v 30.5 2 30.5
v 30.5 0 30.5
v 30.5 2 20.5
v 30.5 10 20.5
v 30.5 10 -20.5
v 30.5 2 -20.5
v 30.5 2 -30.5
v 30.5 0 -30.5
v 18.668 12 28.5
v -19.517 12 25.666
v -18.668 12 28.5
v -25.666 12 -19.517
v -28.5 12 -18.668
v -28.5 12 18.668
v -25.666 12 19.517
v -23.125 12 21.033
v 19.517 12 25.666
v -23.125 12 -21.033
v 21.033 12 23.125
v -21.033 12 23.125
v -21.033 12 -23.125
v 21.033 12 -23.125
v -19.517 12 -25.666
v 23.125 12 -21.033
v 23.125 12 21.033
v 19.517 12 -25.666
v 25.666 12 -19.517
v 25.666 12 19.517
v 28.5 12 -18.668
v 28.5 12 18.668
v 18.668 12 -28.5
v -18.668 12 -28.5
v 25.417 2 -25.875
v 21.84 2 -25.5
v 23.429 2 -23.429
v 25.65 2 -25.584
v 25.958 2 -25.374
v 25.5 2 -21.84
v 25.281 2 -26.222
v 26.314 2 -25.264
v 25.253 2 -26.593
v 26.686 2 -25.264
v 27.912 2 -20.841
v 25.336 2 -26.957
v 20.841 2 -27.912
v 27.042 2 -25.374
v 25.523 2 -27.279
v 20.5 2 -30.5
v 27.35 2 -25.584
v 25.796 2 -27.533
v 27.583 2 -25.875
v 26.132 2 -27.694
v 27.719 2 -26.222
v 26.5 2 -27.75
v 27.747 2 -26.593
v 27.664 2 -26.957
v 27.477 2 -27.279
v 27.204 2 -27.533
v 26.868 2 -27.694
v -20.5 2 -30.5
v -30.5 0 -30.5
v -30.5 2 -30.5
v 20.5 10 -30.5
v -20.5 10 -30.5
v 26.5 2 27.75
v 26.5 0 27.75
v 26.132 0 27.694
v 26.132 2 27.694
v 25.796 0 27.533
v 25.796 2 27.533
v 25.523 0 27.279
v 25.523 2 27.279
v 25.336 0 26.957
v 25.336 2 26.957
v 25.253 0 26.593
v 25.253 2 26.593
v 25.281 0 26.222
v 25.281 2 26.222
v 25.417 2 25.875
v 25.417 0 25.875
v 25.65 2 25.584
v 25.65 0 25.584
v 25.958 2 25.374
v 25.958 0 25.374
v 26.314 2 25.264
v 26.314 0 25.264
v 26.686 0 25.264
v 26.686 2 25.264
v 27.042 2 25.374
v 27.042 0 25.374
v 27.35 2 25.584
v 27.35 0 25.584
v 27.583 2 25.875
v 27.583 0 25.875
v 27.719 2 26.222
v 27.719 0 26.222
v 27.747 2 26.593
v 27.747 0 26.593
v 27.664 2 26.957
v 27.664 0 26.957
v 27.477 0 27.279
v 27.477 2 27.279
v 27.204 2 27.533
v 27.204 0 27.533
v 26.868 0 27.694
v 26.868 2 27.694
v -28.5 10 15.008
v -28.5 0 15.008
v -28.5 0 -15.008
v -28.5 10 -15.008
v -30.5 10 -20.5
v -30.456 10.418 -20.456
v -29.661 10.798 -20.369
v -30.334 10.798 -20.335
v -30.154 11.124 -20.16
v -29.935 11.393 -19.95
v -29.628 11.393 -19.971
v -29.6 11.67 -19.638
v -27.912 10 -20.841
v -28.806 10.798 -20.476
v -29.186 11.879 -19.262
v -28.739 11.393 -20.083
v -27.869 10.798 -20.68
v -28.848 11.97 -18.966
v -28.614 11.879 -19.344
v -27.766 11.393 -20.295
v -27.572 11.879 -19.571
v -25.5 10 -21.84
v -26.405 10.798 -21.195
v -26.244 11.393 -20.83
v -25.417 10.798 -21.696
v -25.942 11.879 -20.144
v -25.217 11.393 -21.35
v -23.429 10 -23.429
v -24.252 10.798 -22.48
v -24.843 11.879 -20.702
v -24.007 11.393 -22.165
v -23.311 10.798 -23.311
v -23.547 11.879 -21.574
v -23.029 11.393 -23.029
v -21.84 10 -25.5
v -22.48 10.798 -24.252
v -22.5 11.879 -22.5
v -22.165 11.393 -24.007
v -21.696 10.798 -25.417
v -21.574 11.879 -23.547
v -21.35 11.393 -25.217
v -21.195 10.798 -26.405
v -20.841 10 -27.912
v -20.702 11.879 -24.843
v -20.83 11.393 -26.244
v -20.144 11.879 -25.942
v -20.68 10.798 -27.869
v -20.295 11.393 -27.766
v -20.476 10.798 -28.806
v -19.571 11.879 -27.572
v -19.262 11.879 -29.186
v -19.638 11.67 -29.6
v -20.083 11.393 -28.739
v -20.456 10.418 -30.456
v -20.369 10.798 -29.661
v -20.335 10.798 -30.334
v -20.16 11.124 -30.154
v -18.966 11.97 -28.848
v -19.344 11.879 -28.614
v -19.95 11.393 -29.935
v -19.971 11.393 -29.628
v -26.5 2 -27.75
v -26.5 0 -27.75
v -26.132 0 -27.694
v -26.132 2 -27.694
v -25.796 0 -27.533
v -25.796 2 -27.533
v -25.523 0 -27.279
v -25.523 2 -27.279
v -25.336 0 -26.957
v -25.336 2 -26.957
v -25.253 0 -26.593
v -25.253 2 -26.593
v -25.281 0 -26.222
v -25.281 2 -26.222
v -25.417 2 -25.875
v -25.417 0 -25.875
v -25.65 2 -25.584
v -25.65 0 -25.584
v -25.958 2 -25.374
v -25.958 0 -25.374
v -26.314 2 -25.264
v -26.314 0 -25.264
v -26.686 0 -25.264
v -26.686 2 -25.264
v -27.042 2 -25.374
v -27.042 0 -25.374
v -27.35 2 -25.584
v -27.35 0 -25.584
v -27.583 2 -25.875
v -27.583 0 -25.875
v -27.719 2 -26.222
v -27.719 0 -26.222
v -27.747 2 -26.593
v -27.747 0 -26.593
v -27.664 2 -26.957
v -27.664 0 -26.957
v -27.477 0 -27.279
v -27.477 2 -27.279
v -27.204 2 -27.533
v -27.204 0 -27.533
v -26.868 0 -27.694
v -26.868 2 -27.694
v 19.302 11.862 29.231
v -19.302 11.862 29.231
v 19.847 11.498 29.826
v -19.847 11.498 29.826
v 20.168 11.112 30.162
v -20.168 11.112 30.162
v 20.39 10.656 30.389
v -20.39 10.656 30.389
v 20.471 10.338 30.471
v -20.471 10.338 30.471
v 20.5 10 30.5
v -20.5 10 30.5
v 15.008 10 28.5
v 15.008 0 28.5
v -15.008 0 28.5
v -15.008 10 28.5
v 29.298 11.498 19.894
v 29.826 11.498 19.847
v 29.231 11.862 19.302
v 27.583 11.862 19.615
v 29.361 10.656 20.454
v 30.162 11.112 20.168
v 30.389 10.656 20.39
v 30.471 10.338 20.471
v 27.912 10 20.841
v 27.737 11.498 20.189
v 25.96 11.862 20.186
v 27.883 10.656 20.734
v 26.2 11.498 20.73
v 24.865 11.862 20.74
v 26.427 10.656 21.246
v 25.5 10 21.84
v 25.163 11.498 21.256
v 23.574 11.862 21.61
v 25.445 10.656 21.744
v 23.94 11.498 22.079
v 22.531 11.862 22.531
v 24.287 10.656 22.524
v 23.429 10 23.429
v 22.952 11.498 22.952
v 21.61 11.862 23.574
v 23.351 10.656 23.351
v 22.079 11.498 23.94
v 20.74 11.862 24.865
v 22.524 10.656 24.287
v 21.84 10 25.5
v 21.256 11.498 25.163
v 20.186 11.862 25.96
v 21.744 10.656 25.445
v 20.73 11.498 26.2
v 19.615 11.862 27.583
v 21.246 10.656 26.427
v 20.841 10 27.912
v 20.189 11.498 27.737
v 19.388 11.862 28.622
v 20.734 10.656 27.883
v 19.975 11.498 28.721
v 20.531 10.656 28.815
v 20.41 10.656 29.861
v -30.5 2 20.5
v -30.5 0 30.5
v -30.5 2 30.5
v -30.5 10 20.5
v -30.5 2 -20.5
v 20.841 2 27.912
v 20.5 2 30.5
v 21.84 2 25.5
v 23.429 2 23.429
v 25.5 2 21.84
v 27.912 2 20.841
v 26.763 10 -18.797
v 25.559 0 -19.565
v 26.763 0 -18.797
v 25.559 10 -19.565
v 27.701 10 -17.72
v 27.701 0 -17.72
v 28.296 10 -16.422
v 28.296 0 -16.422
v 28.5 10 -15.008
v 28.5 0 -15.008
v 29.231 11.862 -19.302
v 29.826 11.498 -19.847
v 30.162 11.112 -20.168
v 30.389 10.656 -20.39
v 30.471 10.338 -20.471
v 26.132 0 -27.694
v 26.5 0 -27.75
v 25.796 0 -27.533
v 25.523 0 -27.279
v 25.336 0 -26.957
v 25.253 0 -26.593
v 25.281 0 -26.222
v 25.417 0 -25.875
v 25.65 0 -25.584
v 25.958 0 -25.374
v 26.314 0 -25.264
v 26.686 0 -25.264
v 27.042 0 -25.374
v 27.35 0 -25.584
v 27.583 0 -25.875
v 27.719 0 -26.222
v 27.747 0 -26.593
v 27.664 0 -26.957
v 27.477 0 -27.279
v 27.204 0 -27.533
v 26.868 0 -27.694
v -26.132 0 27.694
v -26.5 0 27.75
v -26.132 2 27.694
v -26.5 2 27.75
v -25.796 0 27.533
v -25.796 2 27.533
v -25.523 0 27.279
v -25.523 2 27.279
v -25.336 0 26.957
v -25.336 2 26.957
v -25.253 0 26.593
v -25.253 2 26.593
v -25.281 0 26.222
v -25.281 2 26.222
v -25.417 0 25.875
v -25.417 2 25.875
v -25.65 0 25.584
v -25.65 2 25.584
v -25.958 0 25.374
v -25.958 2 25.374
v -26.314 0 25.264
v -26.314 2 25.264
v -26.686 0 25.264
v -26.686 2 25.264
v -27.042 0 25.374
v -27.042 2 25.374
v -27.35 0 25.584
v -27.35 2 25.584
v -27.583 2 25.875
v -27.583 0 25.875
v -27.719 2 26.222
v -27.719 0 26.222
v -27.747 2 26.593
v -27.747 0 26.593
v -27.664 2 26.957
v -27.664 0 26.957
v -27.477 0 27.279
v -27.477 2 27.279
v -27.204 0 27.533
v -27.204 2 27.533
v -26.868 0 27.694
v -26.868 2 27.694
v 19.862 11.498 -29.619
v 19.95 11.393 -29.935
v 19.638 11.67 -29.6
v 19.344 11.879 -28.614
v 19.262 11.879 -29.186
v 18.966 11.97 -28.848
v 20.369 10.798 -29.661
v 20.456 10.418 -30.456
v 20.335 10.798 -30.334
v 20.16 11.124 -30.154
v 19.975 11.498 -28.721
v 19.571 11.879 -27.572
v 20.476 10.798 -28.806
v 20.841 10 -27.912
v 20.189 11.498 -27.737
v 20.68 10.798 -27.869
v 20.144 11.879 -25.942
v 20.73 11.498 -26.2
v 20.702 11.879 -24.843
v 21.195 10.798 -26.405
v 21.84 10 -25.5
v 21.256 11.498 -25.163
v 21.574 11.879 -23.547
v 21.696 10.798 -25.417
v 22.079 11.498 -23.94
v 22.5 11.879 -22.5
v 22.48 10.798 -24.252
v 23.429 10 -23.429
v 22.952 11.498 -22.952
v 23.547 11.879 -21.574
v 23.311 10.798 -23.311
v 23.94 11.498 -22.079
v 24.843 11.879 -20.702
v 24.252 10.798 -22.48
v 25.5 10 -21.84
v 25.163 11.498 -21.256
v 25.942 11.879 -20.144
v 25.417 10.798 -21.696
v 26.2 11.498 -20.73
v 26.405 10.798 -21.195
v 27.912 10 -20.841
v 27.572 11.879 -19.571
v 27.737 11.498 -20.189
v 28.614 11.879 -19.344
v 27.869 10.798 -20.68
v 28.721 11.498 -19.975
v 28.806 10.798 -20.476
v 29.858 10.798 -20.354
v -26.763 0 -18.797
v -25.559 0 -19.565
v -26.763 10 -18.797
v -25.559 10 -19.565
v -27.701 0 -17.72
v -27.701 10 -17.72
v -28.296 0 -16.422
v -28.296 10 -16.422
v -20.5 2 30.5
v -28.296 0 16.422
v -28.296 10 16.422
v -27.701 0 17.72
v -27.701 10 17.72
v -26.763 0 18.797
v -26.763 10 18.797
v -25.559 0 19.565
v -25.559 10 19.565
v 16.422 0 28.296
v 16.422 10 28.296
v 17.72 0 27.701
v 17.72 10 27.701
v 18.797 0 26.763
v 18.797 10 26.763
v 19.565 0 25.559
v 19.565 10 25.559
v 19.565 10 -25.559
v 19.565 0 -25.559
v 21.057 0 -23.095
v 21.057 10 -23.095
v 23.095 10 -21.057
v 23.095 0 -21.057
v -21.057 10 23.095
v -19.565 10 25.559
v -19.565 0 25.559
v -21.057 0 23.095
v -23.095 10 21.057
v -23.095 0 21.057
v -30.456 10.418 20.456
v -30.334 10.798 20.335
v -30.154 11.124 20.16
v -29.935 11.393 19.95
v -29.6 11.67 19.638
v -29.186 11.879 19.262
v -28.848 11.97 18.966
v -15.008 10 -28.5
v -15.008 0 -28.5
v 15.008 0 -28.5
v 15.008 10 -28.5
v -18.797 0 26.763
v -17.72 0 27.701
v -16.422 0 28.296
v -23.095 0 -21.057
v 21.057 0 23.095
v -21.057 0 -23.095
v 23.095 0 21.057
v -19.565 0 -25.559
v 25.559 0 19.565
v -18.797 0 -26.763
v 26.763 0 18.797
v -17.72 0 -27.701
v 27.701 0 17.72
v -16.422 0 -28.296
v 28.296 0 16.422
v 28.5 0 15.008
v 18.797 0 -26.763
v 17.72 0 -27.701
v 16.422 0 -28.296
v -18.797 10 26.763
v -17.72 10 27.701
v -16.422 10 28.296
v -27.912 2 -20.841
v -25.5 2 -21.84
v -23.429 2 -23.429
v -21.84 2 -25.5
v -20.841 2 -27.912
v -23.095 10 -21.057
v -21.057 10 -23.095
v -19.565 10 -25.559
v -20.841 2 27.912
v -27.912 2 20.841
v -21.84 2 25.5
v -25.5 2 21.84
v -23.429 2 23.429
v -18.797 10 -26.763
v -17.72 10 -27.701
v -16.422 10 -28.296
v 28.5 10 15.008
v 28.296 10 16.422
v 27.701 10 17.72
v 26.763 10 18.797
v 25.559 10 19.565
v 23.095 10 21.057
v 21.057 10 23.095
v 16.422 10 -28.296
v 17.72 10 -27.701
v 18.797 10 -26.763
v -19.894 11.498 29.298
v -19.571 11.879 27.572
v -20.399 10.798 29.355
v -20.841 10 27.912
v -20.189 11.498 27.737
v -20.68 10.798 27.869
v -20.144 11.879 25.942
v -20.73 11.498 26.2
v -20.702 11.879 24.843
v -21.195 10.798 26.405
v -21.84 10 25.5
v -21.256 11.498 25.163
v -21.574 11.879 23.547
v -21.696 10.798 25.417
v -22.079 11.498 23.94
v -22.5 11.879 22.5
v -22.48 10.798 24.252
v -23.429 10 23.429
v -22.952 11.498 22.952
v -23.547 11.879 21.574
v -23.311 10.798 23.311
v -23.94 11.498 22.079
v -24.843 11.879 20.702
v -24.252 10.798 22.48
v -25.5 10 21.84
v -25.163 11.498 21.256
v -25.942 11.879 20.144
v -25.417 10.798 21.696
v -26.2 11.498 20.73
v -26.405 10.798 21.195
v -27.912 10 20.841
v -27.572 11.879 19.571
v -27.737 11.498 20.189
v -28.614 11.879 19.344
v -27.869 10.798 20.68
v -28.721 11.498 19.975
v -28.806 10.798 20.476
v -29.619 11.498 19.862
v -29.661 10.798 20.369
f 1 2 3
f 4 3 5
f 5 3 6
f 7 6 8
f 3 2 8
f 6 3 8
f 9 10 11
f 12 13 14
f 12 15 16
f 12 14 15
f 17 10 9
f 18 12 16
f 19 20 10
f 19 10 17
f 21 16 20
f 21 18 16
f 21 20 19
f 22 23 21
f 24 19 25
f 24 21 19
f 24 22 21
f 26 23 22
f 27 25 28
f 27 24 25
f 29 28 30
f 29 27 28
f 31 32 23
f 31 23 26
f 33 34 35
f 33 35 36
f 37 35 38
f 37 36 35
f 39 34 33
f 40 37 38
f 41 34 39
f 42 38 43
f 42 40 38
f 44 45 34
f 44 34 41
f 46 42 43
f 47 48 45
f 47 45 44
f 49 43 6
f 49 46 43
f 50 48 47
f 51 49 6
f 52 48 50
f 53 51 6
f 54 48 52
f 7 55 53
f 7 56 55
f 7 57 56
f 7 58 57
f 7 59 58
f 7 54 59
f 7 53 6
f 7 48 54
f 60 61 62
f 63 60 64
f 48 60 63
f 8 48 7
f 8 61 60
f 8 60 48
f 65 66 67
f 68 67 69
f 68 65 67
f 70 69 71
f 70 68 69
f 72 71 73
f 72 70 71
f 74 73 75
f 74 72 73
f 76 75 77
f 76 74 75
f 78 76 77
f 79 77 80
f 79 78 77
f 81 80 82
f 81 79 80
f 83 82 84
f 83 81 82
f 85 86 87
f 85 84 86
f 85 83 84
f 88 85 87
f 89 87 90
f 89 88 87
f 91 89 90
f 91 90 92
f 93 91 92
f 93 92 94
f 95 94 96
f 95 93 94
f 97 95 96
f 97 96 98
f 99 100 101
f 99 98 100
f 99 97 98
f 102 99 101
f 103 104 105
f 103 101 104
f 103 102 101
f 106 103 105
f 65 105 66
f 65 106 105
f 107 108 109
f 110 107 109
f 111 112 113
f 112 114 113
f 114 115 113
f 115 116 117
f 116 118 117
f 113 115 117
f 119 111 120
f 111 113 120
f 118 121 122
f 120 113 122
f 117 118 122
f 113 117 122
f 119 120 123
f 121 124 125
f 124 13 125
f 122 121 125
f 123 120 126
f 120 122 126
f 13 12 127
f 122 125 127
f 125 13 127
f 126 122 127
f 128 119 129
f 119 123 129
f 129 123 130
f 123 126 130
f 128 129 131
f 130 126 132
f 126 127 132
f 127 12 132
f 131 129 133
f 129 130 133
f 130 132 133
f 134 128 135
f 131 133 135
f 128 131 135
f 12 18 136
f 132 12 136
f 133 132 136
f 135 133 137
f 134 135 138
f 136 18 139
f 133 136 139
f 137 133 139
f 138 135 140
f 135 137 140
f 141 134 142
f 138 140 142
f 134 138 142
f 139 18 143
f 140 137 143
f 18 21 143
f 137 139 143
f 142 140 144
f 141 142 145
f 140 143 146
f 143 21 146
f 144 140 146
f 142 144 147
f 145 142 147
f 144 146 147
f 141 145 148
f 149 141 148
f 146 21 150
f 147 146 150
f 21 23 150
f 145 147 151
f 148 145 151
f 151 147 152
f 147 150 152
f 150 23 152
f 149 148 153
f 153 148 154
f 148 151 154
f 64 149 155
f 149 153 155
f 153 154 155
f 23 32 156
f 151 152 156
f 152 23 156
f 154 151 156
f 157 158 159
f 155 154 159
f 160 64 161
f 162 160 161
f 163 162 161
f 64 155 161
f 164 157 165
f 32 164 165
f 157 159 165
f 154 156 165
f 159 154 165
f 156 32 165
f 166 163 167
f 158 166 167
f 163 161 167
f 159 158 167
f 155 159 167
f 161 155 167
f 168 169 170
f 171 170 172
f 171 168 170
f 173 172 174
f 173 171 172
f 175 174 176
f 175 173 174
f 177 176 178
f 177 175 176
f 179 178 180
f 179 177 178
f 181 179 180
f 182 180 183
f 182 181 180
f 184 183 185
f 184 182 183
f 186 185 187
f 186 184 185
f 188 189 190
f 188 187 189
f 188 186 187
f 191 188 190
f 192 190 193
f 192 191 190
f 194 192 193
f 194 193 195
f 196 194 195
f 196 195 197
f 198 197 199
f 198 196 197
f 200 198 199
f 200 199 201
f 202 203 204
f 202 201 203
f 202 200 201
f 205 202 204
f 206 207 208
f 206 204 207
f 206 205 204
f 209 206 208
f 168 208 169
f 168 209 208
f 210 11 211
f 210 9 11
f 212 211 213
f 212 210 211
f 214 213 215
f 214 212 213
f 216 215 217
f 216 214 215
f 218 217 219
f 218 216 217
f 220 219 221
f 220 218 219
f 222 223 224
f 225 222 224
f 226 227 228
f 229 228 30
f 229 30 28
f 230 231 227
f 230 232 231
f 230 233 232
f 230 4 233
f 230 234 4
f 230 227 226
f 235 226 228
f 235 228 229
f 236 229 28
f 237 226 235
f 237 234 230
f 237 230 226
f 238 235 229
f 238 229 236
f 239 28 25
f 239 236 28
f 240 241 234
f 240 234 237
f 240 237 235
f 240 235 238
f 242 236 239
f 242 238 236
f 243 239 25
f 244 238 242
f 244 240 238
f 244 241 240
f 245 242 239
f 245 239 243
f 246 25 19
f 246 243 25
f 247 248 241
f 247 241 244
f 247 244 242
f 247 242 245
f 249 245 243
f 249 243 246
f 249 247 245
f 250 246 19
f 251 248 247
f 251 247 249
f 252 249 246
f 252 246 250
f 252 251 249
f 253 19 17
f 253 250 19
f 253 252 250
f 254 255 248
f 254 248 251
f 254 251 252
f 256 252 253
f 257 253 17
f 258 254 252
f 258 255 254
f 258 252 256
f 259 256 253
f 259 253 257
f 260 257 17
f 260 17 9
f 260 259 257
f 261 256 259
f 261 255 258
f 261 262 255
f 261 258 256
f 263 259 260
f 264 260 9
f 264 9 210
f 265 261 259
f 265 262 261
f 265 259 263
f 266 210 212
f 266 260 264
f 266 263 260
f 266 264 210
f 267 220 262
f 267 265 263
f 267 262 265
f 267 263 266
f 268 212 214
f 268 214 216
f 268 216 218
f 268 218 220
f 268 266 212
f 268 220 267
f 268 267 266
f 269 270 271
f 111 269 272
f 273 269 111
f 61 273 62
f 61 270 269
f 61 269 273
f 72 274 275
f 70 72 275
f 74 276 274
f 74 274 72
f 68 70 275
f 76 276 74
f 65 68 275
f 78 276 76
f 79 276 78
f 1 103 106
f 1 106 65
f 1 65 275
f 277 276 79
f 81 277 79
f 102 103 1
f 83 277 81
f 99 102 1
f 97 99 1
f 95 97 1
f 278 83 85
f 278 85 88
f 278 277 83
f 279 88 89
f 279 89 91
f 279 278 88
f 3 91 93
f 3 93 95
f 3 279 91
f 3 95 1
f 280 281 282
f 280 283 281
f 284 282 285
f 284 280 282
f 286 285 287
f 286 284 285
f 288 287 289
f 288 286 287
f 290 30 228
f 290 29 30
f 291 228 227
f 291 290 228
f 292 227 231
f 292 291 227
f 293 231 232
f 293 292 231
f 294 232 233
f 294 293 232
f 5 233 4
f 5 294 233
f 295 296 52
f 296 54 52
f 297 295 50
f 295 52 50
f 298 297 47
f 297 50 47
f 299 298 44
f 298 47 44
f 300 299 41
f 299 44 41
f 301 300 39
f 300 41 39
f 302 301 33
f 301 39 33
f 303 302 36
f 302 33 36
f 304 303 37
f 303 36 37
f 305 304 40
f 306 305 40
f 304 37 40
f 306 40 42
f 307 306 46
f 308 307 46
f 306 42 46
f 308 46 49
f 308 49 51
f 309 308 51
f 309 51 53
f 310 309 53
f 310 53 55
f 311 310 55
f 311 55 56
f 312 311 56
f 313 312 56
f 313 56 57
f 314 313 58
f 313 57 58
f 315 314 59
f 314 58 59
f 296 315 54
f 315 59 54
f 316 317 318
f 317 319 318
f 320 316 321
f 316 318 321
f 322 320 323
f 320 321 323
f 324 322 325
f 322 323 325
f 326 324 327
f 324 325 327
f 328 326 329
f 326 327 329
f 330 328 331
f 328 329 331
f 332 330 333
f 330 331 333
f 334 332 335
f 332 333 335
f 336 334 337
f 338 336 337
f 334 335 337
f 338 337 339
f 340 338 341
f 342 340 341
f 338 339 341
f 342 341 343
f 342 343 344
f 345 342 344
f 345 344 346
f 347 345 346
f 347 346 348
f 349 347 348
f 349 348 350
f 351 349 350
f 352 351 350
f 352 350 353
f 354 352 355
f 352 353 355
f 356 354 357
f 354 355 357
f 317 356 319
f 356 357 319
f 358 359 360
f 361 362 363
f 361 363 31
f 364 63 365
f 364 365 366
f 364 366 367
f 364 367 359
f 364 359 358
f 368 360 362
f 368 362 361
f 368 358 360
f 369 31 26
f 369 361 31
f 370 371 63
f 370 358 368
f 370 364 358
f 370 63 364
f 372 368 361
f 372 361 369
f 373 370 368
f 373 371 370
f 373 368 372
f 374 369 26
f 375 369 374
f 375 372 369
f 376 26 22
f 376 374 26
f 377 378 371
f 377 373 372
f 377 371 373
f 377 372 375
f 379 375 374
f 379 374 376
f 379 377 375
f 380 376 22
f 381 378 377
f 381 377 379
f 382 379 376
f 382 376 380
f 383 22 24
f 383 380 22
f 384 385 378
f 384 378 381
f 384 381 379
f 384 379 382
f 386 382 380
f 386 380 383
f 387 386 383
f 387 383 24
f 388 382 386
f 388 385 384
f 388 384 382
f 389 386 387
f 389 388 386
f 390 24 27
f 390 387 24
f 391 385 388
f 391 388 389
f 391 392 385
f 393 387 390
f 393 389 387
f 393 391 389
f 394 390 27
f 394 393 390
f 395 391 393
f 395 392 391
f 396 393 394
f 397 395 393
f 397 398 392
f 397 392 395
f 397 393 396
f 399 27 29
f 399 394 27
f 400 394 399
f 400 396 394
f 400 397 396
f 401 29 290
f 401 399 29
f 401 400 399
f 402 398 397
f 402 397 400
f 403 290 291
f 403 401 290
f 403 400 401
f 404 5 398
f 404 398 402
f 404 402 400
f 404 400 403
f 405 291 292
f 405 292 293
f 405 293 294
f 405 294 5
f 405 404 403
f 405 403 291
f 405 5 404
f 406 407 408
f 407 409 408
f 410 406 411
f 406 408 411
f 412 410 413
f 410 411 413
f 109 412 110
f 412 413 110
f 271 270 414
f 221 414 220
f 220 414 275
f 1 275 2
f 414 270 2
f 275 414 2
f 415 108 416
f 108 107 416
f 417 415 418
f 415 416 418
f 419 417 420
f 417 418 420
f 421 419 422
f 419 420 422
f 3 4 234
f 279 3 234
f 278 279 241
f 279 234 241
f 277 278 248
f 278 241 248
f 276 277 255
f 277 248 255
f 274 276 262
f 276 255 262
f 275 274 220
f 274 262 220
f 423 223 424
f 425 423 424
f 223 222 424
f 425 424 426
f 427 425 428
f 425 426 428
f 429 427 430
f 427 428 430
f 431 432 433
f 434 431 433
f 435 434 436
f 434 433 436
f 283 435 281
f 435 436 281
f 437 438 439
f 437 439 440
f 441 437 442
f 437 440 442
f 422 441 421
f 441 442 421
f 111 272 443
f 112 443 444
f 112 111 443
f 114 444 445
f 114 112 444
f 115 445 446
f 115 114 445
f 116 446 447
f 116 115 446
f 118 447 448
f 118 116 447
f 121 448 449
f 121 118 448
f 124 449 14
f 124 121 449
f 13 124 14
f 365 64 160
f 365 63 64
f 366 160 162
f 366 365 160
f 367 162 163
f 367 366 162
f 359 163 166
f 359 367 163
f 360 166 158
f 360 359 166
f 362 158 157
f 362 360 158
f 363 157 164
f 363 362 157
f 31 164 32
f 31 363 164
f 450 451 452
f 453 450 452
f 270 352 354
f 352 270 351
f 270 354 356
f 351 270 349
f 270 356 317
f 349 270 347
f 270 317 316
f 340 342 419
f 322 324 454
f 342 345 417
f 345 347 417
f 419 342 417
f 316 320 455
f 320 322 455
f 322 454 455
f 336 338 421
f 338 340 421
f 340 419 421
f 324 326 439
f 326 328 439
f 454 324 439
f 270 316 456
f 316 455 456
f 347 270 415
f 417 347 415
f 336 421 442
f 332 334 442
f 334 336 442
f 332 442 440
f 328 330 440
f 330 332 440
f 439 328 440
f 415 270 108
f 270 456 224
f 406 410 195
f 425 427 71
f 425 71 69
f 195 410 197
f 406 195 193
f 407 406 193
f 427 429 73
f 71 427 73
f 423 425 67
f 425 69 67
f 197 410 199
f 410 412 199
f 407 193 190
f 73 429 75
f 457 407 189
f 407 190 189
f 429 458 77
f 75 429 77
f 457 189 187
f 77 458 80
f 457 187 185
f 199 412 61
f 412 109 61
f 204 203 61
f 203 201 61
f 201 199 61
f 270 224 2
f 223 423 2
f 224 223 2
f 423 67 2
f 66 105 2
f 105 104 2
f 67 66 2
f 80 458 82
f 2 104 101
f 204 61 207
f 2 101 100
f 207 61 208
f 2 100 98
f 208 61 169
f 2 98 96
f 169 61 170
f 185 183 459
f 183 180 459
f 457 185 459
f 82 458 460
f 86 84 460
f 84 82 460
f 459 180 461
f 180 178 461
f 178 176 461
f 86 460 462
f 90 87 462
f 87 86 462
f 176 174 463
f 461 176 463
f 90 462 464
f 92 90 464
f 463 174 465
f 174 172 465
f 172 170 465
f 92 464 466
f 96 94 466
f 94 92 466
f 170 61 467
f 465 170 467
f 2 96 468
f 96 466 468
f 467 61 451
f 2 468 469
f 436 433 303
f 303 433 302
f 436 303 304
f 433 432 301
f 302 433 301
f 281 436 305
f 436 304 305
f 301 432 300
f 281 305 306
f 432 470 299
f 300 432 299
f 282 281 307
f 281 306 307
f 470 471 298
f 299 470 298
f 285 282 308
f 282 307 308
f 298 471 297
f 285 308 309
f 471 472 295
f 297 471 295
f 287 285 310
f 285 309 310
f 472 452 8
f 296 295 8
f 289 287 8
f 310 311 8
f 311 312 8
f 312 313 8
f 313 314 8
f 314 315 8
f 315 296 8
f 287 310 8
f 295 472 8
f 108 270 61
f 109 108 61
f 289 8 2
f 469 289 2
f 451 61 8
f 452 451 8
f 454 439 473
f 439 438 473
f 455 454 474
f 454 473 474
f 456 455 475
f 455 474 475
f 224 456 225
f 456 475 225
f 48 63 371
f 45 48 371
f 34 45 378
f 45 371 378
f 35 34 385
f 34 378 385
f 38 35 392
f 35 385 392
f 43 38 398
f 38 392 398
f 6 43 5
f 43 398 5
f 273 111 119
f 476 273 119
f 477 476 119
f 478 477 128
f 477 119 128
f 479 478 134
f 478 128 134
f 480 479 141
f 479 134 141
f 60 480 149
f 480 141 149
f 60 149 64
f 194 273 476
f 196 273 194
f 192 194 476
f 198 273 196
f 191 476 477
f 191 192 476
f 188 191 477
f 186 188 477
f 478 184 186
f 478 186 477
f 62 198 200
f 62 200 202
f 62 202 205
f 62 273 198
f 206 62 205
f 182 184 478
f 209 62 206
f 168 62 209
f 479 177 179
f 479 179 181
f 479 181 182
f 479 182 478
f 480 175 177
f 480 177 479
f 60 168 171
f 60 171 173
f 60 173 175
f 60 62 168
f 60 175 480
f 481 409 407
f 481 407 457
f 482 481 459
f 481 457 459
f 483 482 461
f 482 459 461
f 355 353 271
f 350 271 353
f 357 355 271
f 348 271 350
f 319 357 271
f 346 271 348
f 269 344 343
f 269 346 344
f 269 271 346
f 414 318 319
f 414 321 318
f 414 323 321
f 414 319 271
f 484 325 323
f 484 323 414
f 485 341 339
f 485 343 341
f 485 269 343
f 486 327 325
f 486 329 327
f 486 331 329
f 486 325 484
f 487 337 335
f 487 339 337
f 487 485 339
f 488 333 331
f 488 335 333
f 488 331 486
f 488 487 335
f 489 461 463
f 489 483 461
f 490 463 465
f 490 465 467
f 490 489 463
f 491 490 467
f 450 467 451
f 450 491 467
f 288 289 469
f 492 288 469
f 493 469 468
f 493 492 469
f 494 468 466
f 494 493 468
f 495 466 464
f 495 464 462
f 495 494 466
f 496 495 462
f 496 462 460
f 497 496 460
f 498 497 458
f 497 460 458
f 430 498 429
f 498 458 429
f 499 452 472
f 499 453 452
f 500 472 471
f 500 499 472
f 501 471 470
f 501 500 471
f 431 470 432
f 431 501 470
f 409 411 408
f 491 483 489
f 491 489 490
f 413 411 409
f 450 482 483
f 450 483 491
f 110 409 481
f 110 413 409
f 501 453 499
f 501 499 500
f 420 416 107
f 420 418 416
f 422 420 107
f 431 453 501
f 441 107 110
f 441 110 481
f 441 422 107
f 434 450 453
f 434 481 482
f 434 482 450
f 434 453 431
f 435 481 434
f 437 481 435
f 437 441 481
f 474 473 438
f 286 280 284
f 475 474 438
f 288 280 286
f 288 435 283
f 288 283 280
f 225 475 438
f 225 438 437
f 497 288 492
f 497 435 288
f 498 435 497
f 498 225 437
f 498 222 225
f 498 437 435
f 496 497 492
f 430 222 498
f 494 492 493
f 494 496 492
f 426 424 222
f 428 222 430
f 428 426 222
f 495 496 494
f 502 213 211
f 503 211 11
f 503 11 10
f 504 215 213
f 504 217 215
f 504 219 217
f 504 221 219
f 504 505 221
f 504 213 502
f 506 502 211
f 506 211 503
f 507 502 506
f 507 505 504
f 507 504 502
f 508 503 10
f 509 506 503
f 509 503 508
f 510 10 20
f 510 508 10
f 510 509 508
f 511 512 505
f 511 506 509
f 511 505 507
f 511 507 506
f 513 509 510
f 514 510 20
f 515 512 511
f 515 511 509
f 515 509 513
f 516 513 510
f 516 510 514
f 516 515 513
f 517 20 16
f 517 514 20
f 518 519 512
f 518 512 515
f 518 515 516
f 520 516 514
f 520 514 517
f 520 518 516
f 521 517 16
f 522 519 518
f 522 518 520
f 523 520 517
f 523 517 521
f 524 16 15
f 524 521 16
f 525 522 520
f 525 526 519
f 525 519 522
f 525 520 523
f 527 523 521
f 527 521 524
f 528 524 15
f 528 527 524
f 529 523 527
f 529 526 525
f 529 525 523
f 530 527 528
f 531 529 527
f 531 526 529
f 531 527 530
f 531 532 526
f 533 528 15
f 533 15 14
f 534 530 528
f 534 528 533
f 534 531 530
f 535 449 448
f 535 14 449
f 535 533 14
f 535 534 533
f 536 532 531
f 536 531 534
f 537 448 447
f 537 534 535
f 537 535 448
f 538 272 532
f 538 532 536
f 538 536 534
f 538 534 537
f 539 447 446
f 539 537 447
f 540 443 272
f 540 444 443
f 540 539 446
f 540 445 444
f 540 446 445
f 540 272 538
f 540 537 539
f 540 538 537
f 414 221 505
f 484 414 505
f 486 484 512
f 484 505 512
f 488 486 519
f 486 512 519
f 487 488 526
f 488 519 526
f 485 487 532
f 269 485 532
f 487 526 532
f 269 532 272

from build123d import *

# Parameters (mm, degrees)
SKETCH2_W           = 61
SKETCH2_H           = 61
BOSS_EXTRUDE1_DEPTH = 12
SKETCH4_R           = 10
CUT_EXTRUDE3_DEPTH  = 10
CUT_EXTRUDE5_DEPTH  = 10
FILLET2_R           = 2
FILLET3_R           = 5


with BuildPart() as part:
    # Sketch2 → Boss-Extrude1 (new body)
    with BuildSketch(Plane(origin=(0, 0, 0), x_dir=(1, 0, 0), z_dir=(0, 1, 0))):
        Rectangle(SKETCH2_W, SKETCH2_H)
    extrude(amount=BOSS_EXTRUDE1_DEPTH)

    # Sketch4 → Cut-Extrude3 (cut)
    with BuildSketch(Plane(origin=(0, 12, 0), x_dir=(1, 0, 0), z_dir=(0, 1, 0))):
        with Locations((30.5, -30.5)):
            Circle(SKETCH4_R)
        with Locations((-30.5, -30.5)):
            Circle(SKETCH4_R)
        with Locations((-30.5, 30.5)):
            Circle(SKETCH4_R)
        with Locations((30.5, 30.5)):
            Circle(SKETCH4_R)
    extrude(amount=-CUT_EXTRUDE3_DEPTH, mode=Mode.SUBTRACT)

    # Sketch8 → Cut-Extrude5 (cut)
    with BuildSketch(Plane.XZ):
        with BuildLine():
            Line((-18.667840434, -28.5), (18.667840434, -28.5))
            ThreePointArc((18.667840434, -28.5), (22.014718626, -22.014718626), (28.5, -18.667840434))
            Line((28.5, -18.667840434), (28.5, 18.667840434))
            ThreePointArc((28.5, 18.667840434), (22.014718626, 22.014718626), (18.667840434, 28.5))
            Line((18.667840434, 28.5), (-18.667840434, 28.5))
            ThreePointArc((-18.667840434, 28.5), (-22.014718626, 22.014718626), (-28.5, 18.667840434))
            Line((-28.5, 18.667840434), (-28.5, -18.667840434))
            ThreePointArc((-28.5, -18.667840434), (-22.014718626, -22.014718626), (-18.667840434, -28.5))
        make_face()
    extrude(amount=-CUT_EXTRUDE5_DEPTH, mode=Mode.SUBTRACT)

    # Fillet2
    fillet2_edges = [part.edges().sort_by_distance(p)[0] for p in [
        (30.5, 12, 0),
        (0, 12, -30.5),
        (-30.5, 12, 0),
        (0, 12, 30.5),
        (23.428932188, 12, -23.428932188),
        (-23.428932188, 12, -23.428932188),
        (-23.428932188, 12, 23.428932188),
        (23.428932188, 12, 23.428932188),
    ]]
    fillet(fillet2_edges, radius=FILLET2_R)

    # Sketch15 → M3x0.5 Tapped Hole1 (revolve, cut)
    with BuildSketch(Plane(origin=(26.5, 2, 26.5), x_dir=(0, 0, 1), z_dir=(1, 0, 0))):
        Polygon((0, 0), (0, 8.251075774), (1.25, 7.5), (1.25, 0), align=None)
    m3x0_5_tapped_hole1 = revolve(axis=Axis((26.5, 8.35, 26.5), (0, -1, 0)), mode=Mode.SUBTRACT)

    # Mirror1: M3x0.5 Tapped Hole1 across plane
    add(m3x0_5_tapped_hole1.mirror(Plane.XY), mode=Mode.SUBTRACT)

    # Mirror2: M3x0.5 Tapped Hole1 across plane
    add(m3x0_5_tapped_hole1.mirror(Plane(origin=(0, 0, 0), x_dir=(0, 0, 1), z_dir=(1, 0, 0))), mode=Mode.SUBTRACT)

    # Mirror2 copy 1 sketch → Mirror2 copy 1 (revolve, cut)
    with BuildSketch(Plane(origin=(-26.5, 2, -26.5), x_dir=(0, 0, -1), z_dir=(-1, 0, 0))):
        Polygon((0, 0), (0, 8.251075774), (1.25, 7.5), (1.25, 0), align=None)
    revolve(axis=Axis((-26.5, 8.35, -26.5), (0, -1, 0)), mode=Mode.SUBTRACT)

    # Fillet3
    fillet3_edges = [part.edges().sort_by_distance(p)[0] for p in [
        (28.5, 5, -18.667840434),
        (18.667840434, 5, -28.5),
        (-18.667840434, 5, -28.5),
        (-28.5, 5, -18.667840434),
        (-28.5, 5, 18.667840434),
        (-18.667840434, 5, 28.5),
        (18.667840434, 5, 28.5),
        (28.5, 5, 18.667840434),
    ]]
    fillet(fillet3_edges, radius=FILLET3_R)


solid = part.part
